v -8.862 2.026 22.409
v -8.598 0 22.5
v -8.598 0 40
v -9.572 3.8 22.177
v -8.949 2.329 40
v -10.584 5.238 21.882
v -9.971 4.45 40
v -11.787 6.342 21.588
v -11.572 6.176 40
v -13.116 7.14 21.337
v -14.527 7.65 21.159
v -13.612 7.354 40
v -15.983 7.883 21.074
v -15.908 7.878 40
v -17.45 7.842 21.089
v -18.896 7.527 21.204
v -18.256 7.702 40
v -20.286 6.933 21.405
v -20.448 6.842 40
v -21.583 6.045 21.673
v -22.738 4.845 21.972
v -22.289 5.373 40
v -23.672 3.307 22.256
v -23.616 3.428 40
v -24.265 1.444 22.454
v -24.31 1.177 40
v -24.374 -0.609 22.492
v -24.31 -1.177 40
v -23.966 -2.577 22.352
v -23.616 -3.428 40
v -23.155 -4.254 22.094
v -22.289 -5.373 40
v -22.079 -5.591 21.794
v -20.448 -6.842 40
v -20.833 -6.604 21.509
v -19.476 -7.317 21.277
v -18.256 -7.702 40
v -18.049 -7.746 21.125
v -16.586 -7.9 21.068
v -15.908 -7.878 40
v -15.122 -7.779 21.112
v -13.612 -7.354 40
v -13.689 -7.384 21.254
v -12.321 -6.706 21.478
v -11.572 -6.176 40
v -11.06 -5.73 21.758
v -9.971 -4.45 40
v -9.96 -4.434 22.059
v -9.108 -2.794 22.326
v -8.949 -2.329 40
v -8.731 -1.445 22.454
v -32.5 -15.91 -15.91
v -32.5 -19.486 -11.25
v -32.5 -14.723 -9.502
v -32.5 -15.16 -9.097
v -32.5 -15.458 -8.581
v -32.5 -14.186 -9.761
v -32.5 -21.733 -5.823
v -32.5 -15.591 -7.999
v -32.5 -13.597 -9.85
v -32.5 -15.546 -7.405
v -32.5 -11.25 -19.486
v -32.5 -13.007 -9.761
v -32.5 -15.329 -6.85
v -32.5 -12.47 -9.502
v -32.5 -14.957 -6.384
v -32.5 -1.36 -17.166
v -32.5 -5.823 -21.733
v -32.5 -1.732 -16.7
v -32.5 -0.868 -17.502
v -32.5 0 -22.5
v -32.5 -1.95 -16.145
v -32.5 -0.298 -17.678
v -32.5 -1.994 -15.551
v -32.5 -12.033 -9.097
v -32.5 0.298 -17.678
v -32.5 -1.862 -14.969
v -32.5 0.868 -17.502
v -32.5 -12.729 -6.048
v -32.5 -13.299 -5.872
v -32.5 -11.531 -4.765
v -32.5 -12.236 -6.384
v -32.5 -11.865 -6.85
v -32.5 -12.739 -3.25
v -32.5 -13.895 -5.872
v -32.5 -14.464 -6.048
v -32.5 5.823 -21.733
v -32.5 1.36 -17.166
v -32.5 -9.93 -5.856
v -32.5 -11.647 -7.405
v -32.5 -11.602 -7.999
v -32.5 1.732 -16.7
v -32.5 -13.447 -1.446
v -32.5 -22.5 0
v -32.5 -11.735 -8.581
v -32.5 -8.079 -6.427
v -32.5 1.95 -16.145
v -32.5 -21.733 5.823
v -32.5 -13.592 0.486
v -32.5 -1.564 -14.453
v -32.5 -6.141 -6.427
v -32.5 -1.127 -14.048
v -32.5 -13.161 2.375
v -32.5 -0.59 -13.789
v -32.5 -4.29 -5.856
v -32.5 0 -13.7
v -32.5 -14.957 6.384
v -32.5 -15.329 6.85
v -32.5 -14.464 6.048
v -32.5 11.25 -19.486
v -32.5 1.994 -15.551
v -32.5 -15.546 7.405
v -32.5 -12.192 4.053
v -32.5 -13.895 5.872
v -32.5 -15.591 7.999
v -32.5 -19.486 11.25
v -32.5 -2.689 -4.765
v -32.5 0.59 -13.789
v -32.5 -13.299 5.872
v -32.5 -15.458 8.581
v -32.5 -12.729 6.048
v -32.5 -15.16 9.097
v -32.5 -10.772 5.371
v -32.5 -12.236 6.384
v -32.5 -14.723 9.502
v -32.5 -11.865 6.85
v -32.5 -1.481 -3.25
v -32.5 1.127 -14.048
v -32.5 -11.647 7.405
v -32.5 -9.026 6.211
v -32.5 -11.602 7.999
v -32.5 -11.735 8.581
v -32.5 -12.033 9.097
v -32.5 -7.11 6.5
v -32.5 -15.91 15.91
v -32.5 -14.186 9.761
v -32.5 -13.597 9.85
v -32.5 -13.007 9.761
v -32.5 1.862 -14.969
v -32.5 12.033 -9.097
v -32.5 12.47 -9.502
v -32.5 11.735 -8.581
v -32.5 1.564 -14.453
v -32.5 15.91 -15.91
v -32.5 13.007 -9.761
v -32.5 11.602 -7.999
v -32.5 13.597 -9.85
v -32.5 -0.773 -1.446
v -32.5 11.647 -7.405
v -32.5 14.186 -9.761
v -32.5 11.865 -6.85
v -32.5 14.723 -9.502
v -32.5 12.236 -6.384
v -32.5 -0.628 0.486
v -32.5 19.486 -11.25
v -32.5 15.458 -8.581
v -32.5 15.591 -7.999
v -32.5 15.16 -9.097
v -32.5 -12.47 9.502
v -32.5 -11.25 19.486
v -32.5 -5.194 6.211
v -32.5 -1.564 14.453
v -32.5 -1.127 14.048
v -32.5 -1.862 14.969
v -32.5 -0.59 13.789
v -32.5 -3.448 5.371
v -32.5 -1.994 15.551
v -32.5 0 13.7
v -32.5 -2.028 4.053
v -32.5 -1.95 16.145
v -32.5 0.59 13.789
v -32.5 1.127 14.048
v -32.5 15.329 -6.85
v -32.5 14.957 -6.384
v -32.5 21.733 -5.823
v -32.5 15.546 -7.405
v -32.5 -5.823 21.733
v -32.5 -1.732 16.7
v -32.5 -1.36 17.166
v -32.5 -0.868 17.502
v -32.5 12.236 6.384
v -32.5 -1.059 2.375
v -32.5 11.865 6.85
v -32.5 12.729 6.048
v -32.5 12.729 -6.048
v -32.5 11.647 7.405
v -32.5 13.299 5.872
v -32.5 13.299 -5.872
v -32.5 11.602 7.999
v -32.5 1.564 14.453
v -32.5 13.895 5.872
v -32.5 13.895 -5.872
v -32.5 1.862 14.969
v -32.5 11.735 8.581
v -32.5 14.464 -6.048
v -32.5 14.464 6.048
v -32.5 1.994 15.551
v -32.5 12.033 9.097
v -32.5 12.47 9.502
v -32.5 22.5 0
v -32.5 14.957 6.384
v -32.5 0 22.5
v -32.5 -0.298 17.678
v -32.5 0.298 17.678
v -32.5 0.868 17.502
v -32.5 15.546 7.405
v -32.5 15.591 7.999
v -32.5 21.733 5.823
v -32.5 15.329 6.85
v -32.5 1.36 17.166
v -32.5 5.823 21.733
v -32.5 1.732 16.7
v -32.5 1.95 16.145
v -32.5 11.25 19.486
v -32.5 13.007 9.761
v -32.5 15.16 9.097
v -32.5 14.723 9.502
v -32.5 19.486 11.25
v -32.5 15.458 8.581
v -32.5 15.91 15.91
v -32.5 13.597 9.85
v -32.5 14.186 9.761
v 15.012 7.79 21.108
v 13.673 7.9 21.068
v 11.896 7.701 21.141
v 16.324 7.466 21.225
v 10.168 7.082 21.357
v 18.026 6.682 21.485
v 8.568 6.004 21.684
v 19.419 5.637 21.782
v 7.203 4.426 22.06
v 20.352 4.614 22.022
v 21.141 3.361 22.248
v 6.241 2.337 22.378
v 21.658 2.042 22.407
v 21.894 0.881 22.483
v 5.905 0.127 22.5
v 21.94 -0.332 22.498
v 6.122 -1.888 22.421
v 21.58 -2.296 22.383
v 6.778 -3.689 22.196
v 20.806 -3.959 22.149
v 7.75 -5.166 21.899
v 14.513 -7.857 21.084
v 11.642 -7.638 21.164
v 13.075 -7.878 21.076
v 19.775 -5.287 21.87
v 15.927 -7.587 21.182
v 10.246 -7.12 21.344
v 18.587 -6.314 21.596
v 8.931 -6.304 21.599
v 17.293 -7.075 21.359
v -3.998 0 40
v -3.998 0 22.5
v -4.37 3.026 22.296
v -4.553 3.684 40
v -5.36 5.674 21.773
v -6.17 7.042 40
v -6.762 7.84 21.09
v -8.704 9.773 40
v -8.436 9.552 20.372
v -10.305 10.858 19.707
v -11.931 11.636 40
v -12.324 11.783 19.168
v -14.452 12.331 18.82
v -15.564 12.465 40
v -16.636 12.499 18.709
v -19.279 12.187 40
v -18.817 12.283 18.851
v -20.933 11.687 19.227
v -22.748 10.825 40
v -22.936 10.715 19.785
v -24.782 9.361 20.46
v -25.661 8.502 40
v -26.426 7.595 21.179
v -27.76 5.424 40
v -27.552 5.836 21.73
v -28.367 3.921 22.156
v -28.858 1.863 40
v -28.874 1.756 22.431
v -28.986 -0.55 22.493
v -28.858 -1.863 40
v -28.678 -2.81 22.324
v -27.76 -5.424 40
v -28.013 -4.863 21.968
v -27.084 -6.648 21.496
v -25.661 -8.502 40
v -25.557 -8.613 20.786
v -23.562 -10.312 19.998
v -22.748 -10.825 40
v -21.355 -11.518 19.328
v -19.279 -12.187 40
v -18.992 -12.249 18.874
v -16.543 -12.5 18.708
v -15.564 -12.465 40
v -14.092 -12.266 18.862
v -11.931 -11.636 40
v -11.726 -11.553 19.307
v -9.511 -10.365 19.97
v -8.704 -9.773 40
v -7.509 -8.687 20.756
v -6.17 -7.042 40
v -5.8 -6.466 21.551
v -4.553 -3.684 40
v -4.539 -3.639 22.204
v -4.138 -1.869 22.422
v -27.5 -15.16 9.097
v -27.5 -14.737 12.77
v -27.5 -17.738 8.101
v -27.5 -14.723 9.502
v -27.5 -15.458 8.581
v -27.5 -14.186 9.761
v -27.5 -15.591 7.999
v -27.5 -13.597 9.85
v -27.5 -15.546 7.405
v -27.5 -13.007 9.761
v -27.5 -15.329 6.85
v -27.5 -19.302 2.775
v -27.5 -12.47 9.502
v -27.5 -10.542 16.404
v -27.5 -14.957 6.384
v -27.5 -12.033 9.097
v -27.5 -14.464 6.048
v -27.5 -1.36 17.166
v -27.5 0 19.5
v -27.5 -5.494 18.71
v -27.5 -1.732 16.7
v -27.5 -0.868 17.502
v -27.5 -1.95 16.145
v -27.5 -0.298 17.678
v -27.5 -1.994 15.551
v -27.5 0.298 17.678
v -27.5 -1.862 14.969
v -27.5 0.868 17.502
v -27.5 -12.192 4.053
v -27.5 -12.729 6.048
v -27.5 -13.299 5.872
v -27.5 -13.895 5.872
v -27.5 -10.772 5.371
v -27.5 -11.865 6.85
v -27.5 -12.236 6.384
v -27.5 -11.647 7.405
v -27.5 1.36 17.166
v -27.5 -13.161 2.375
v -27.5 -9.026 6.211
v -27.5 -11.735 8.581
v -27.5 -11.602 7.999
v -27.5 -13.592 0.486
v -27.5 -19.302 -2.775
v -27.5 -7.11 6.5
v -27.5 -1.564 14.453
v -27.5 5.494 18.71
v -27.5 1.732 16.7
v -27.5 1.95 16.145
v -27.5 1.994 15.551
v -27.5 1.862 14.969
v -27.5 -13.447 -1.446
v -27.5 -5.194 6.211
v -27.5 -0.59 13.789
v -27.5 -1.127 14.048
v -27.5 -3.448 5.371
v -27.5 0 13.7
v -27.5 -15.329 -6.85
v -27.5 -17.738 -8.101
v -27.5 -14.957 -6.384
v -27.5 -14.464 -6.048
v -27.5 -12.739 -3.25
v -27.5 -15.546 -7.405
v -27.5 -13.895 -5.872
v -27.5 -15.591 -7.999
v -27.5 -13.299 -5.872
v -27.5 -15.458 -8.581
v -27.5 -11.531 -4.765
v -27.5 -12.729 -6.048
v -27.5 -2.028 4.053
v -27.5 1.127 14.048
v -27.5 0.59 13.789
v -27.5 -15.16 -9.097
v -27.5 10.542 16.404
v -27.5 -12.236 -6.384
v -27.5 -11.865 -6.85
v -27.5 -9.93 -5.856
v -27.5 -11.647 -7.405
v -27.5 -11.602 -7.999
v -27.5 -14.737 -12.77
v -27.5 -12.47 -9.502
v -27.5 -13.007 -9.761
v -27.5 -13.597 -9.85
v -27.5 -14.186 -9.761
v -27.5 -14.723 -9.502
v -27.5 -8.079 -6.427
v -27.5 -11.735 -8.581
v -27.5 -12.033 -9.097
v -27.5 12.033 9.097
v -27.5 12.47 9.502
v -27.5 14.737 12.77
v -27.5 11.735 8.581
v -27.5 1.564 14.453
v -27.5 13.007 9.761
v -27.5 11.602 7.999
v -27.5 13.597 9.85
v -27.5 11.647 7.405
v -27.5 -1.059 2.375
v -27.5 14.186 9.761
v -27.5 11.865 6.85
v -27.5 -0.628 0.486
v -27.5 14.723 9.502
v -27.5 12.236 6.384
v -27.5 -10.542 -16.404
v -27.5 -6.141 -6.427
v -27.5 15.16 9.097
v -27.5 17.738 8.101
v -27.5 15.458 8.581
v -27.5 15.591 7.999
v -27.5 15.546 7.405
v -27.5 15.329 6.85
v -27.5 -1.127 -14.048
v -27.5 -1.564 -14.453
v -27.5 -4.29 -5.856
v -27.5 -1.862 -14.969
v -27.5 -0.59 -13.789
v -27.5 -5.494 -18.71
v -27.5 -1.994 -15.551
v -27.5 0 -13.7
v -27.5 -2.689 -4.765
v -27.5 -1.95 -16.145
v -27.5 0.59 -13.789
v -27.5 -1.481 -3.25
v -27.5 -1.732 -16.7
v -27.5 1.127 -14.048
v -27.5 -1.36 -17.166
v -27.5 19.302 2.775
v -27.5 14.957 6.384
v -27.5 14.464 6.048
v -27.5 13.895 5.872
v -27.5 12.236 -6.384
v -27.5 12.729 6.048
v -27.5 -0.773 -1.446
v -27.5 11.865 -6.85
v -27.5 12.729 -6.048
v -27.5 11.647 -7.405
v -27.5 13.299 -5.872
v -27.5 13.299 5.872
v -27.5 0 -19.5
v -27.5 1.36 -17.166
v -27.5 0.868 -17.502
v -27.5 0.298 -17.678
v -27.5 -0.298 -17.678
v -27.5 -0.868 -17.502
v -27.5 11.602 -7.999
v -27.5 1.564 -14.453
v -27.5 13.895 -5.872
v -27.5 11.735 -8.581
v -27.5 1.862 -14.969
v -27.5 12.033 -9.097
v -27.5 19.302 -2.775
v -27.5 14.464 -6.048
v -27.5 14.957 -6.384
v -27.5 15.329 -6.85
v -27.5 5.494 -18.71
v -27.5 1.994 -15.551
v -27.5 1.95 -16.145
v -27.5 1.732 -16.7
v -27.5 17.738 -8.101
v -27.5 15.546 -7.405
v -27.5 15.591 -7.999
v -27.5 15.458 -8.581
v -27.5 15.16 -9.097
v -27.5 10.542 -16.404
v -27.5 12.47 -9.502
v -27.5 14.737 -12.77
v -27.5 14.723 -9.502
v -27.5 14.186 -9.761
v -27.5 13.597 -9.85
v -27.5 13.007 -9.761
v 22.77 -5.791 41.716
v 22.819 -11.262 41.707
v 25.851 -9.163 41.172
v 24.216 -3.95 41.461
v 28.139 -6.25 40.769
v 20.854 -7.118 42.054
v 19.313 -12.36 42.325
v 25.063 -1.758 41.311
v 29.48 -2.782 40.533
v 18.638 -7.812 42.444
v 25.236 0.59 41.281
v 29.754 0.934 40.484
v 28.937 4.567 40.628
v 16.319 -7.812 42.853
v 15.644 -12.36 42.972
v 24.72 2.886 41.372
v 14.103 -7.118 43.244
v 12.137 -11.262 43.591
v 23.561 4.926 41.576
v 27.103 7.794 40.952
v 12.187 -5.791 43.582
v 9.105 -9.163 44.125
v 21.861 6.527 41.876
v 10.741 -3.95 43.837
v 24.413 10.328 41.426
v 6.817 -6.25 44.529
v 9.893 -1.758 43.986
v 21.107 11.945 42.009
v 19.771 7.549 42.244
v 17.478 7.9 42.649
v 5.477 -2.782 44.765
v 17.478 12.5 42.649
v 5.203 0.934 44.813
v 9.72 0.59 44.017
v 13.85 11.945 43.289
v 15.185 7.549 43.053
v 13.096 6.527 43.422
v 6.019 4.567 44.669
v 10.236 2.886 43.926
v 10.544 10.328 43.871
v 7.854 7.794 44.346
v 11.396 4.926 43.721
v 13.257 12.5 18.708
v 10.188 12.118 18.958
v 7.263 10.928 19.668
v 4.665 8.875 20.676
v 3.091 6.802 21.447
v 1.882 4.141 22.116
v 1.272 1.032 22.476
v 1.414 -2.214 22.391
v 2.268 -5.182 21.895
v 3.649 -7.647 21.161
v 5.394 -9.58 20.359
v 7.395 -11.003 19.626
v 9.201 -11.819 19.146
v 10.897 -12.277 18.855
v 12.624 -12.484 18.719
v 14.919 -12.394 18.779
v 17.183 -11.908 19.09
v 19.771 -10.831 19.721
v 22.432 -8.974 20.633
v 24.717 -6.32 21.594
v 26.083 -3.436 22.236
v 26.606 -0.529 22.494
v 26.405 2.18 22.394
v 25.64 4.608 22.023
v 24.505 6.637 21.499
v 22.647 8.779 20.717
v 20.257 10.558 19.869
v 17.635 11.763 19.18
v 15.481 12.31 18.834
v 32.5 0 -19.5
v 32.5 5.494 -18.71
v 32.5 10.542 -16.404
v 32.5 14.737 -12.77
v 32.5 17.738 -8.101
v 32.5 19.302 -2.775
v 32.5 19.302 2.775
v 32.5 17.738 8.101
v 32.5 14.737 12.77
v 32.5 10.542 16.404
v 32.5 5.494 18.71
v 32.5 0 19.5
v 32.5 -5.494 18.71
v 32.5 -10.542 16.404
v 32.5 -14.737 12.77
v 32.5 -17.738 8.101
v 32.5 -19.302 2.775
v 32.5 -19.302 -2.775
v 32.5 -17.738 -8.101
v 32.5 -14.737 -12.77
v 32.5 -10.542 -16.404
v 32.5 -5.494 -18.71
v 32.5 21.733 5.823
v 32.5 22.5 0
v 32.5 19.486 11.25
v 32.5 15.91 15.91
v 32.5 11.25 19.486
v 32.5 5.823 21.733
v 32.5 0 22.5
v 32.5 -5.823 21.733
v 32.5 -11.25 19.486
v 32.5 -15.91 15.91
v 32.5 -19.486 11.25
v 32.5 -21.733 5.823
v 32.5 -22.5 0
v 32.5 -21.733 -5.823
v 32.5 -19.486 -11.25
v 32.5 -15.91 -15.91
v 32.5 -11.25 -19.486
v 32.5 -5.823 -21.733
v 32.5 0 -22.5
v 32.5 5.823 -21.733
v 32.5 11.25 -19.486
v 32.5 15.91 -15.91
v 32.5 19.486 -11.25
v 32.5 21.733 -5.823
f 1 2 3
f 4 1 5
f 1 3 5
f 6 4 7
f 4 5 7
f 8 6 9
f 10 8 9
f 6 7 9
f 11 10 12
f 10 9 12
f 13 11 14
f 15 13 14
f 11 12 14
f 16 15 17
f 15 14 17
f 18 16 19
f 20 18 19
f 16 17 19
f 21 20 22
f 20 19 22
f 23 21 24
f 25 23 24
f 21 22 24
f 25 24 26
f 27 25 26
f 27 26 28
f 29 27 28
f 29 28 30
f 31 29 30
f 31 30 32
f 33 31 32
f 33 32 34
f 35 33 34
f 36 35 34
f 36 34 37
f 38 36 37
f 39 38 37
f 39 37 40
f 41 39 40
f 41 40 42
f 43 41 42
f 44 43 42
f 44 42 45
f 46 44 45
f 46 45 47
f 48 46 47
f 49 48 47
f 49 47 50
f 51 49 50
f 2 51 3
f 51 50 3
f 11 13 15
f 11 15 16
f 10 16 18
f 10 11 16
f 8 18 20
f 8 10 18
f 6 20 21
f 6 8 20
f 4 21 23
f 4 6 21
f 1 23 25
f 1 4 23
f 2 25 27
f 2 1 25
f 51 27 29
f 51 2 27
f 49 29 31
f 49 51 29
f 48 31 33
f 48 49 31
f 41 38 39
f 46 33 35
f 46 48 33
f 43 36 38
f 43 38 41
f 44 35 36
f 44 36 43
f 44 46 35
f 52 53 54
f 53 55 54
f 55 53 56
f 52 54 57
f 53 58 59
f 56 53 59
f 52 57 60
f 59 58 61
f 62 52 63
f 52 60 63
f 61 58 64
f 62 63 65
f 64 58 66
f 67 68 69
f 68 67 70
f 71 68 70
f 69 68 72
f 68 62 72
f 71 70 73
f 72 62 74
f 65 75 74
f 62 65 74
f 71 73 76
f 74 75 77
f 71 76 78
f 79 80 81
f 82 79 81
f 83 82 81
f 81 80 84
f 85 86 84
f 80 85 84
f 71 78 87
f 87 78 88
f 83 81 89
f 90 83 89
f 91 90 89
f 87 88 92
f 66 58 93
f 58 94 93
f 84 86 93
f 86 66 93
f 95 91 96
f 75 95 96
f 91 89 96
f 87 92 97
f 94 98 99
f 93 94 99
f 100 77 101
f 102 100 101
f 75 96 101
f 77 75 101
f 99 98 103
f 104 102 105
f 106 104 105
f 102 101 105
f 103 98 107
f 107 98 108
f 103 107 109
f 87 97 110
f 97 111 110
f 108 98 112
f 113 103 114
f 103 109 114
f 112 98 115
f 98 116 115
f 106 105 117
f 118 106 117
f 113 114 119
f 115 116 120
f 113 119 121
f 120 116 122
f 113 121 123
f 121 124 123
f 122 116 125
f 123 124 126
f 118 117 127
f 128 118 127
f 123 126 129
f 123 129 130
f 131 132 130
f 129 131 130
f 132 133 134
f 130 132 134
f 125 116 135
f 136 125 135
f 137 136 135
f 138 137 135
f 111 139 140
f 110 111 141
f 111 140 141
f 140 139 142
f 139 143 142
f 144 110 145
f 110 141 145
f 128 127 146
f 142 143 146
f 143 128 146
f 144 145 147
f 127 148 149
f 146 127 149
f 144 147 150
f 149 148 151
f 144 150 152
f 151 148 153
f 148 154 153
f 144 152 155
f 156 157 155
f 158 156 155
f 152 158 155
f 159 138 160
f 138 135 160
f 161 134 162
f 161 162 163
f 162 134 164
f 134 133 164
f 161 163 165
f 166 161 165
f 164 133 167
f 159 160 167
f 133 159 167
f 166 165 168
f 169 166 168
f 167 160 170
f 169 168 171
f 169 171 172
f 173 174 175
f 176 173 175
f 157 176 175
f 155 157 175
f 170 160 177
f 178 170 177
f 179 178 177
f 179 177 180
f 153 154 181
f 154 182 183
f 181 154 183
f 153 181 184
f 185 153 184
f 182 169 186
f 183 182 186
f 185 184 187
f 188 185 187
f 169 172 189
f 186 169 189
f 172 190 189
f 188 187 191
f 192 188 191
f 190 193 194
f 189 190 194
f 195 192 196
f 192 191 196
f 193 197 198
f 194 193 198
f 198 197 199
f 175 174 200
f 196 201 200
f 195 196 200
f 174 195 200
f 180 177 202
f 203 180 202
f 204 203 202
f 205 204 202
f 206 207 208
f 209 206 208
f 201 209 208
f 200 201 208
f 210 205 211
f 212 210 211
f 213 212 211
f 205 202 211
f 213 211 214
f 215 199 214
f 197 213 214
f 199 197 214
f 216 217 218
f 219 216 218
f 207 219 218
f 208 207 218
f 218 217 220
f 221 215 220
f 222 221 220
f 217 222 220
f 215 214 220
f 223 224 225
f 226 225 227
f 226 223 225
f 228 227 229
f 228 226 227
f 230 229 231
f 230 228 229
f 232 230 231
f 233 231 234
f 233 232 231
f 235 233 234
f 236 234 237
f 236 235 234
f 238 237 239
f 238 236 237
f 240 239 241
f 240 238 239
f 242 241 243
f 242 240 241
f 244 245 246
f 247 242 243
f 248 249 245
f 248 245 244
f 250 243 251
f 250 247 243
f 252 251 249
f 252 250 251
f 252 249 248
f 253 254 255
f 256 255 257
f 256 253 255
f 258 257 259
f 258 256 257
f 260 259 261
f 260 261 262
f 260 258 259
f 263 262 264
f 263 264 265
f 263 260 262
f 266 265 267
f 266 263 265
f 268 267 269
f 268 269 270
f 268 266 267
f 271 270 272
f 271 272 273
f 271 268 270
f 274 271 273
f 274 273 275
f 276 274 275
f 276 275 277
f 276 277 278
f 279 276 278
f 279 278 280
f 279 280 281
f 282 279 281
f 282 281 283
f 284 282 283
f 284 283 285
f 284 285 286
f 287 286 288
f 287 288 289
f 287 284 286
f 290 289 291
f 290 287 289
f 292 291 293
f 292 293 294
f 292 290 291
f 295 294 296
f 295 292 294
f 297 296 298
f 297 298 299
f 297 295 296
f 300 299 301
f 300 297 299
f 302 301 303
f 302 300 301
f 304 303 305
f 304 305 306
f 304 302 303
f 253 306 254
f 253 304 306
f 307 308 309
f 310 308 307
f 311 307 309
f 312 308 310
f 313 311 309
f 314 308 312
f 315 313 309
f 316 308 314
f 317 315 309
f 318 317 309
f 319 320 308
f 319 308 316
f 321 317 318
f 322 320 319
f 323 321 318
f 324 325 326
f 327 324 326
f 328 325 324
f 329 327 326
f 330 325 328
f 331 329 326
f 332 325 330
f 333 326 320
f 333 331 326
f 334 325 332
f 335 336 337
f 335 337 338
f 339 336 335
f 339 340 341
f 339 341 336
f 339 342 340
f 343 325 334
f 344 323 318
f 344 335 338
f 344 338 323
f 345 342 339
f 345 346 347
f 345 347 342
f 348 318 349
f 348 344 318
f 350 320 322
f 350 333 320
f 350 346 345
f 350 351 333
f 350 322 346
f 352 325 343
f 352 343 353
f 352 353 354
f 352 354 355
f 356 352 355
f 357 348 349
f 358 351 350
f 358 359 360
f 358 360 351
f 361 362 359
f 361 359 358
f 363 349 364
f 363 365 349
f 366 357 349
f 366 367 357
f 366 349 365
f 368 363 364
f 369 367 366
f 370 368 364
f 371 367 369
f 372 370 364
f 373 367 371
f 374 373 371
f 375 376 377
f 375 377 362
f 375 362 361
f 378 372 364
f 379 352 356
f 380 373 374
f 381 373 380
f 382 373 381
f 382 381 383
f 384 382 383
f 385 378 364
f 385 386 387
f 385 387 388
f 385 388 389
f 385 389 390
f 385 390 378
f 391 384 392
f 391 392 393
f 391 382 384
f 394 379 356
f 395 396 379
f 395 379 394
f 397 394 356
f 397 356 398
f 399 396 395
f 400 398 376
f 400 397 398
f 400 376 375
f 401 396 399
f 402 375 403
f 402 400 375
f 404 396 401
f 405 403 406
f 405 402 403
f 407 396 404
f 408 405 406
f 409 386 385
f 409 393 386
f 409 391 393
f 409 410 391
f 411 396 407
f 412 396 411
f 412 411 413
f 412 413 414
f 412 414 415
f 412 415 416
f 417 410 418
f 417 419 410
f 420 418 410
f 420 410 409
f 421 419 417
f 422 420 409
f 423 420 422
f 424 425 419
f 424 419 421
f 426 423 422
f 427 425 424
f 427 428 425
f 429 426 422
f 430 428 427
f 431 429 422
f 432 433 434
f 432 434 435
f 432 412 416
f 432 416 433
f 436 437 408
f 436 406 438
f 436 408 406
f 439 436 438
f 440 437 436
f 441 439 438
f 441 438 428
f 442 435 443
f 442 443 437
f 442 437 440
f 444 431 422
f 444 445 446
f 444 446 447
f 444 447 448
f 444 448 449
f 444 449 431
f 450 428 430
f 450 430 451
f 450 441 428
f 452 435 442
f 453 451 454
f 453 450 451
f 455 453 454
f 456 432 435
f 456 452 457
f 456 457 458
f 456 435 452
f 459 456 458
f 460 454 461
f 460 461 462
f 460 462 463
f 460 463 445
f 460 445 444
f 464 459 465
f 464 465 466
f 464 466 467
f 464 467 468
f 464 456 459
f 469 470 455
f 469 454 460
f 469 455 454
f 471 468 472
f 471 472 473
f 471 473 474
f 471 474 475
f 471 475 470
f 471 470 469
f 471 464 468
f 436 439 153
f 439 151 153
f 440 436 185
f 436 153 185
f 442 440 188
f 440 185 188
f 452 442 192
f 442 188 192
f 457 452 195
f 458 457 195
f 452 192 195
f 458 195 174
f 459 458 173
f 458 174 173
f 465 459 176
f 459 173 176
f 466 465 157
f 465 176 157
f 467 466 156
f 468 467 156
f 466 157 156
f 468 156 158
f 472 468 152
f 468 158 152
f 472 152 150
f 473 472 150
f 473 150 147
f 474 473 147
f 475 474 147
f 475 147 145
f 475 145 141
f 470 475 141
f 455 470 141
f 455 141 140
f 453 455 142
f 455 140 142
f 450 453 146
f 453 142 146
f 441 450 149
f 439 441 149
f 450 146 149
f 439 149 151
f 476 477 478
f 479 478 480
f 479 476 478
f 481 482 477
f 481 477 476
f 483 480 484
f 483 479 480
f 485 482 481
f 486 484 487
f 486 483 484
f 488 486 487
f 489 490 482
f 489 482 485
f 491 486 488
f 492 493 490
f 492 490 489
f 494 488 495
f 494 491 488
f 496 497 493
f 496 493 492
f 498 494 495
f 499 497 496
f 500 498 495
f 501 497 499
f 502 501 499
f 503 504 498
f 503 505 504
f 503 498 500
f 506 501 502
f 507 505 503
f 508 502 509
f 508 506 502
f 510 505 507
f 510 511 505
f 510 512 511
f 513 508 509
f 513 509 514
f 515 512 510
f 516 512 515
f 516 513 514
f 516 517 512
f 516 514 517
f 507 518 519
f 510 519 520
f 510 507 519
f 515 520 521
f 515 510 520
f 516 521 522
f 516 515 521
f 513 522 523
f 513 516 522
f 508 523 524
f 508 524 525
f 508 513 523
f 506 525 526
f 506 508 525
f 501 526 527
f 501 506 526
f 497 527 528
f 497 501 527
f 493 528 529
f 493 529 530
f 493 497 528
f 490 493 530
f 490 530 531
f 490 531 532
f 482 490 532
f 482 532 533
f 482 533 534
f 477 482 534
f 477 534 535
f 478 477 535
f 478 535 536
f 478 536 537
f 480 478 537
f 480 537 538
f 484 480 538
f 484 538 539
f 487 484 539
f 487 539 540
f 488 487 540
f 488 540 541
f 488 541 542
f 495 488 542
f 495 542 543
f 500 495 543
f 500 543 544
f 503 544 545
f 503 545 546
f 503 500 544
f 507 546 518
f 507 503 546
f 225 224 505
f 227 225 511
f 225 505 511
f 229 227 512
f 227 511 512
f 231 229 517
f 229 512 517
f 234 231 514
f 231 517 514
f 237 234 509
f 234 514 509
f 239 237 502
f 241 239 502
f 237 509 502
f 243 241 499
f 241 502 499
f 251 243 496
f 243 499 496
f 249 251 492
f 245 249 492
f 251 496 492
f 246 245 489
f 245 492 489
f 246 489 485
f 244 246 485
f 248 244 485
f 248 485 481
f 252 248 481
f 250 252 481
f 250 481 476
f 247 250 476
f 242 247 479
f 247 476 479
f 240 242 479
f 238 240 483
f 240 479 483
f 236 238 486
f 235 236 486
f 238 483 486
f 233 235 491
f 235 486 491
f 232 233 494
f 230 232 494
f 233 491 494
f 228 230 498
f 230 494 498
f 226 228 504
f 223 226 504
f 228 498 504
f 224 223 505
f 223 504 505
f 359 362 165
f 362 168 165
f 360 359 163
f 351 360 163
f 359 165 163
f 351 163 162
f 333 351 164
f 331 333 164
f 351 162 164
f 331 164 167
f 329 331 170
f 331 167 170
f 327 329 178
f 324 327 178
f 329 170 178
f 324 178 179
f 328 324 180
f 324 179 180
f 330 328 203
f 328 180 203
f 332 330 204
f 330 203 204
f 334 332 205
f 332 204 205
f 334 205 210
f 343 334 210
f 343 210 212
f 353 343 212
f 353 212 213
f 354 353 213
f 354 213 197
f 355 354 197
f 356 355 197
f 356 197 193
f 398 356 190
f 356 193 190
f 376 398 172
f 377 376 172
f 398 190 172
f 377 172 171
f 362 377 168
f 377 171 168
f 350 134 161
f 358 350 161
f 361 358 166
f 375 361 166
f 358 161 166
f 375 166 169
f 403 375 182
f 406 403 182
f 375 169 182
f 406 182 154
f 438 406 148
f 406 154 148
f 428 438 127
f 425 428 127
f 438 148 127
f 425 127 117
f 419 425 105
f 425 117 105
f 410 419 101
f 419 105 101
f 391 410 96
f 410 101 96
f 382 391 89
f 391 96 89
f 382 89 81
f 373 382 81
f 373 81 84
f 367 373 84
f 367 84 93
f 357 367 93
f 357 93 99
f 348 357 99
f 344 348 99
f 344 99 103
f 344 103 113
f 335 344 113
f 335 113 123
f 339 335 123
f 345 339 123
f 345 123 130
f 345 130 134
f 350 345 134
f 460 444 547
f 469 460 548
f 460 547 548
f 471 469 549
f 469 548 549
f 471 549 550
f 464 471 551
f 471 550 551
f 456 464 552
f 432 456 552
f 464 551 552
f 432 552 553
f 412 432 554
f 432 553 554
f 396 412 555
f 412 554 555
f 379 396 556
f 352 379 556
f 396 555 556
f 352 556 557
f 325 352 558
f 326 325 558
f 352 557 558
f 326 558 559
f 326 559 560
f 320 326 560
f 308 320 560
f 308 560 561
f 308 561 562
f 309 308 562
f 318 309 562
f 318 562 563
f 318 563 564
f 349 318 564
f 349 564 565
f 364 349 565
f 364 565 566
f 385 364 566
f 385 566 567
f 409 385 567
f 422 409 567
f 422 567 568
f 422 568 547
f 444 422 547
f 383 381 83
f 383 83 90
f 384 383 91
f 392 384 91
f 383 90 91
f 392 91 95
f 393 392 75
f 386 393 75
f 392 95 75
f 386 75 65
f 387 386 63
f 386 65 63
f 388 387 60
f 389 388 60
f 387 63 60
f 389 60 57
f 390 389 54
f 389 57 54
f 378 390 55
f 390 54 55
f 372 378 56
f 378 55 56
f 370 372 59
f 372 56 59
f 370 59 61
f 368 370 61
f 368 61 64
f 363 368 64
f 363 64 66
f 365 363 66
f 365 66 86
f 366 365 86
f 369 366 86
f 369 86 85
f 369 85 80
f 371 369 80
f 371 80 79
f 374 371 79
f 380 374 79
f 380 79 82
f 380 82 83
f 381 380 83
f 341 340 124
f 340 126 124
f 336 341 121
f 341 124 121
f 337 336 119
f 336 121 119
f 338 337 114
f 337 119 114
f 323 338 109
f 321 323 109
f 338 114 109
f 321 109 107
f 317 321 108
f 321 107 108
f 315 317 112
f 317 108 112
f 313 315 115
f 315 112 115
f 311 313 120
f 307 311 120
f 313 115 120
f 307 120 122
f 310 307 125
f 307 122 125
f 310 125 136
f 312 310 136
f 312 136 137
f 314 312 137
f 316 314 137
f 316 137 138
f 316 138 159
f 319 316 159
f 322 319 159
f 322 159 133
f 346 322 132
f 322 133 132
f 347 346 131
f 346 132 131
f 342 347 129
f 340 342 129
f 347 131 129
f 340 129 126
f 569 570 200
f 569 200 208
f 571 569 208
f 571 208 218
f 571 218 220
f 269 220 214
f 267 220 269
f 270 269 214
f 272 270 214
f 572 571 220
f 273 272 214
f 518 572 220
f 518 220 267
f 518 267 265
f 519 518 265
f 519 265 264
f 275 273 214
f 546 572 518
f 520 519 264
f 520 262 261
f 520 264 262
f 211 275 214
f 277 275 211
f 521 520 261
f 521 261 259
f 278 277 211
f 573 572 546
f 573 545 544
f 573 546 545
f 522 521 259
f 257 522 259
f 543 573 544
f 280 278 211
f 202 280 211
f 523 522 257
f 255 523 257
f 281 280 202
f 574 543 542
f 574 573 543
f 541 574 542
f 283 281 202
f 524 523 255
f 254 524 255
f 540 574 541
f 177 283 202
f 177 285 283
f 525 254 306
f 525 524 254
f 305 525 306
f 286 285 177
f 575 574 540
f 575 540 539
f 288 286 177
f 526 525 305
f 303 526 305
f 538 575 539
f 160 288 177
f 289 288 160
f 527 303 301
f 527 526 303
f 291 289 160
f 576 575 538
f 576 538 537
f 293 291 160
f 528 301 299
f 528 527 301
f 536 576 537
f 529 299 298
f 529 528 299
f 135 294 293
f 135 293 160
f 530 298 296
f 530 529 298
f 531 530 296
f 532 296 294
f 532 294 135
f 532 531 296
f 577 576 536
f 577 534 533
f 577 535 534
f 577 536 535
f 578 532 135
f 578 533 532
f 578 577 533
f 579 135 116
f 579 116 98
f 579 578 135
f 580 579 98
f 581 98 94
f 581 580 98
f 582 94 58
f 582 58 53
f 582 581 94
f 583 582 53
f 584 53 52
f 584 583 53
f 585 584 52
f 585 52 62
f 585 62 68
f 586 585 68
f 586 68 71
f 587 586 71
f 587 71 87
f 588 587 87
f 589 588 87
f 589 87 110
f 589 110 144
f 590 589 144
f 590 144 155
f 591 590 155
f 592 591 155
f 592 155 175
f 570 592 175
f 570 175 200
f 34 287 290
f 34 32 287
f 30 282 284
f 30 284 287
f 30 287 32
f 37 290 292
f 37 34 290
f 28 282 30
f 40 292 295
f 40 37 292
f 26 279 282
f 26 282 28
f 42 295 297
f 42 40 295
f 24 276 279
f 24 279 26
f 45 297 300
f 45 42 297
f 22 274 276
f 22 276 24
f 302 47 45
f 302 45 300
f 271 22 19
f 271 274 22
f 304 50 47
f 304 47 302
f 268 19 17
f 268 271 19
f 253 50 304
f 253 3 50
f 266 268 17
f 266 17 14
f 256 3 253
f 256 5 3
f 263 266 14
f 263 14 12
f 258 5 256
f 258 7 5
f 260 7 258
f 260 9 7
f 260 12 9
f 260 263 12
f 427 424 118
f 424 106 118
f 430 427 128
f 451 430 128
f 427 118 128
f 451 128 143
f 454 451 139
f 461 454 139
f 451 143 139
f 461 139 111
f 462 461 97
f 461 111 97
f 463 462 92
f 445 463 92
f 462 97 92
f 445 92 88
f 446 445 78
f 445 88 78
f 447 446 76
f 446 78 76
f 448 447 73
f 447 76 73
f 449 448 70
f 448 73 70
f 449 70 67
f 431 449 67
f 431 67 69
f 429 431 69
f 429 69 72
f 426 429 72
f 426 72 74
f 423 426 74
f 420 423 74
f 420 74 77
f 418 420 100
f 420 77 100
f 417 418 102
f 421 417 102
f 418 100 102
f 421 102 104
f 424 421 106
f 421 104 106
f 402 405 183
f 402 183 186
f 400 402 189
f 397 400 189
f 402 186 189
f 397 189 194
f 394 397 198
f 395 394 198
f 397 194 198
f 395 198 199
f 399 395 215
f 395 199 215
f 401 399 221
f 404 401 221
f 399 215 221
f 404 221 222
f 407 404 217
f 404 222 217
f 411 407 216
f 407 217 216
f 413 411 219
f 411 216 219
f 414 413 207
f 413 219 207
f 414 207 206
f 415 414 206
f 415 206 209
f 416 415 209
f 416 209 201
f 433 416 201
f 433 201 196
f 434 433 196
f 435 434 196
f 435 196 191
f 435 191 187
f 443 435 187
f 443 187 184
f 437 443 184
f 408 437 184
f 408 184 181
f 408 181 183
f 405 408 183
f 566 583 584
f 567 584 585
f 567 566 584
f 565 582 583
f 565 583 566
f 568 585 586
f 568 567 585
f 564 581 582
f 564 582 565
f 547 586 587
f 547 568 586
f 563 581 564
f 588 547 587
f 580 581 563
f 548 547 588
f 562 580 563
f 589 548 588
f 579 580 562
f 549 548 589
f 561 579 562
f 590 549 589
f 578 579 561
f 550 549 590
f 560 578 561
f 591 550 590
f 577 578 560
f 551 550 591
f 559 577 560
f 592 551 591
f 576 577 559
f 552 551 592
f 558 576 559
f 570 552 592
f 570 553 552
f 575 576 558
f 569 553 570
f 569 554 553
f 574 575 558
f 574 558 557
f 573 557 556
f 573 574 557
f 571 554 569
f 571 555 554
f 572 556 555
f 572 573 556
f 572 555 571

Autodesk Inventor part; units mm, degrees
ref_plane "YZ Plane" through (0, 0, 0) normal (1, 0, 0) x (0, 1, 0)
sketch "Sketch2" plane through (0, 0, 0) normal (1, 0, 0) x (0, 1, 0)
  circle A0 centre (0, 0) radius 19.5
  circle A1 centre (0, 0) radius 22.5
  dimension "d0" = 39
  dimension "d1" = 45
extrude "Extrusion1" add sketch "Sketch2" along normal mid plane 65 contours A0 | A1
sketch "Sketch3" plane through (32.5, 0, 0) normal (1, 0, 0) x (0, 0, -1)
  circle A0 centre (0, 0) radius 19.5
  dimension "d4" = 39
extrude "Extrusion2" cut sketch "Sketch3" against normal blind 60
sketch "Sketch4" plane through (-32.5, 0, 0) normal (-1, 0, 0) x (0, 0, 1)
  circle A0 centre (-15.7, 0) radius 2
  point P0 (0, 0)
  point P1 (0, 0)
  dimension "d7" = 4
  dimension "d45" = 15.7
extrude "Extrusion3" cut sketch "Sketch4" against normal blind 5
pattern_circular "Circular Pattern1" count 6 over 360 about axis through (-10, 0, 0) along (1, 0, 0) of "Extrusion3"
sketch "Sketch5" plane through (-32.5, 0, 0) normal (-1, 0, 0) x (0, 0, 1)
  circle A0 centre (0, -7.11) radius 6.5
  point P0 (0, 0)
  dimension "d13" = 13
extrude "Extrusion4" cut sketch "Sketch5" against normal blind 5
ref_plane "Work Plane1" through (0, 0, 40) normal (0, 0, 1) x (1, 0, 0)
sketch "Sketch6" plane through (0, 0, 40) normal (0, 0, 1) x (1, 0, 0)
  circle A0 centre (-16.4979, 0) radius 12.5
  circle A1 centre (-16.4979, 0) radius 7.9
  point P0 (0, 0)
  dimension "d17" = 25
  dimension "d18" = 15.8
extrude "Extrusion5" add sketch "Sketch6" against normal up to surface
sketch "Sketch7" plane through (0, 0, 40) normal (0, 0, 1) x (1, 0, 0)
  line L0 (32.5, -22.5) -> (32.5, 22.5) projected
  point P0 (0, 0)
ref_plane "Work Plane2" through (32.5, -22.5, 40) normal (0.1736, 0, 0.9848) x (0, 1, 0)
sketch "Sketch8" plane through (32.5, -22.5, 40) normal (0.1736, 0, 0.9848) x (0, 1, 0)
  circle A0 centre (22.5, 15.2535) radius 12.5
  circle A1 centre (22.5, 15.2535) radius 7.9
  ellipse E0 centre (22.5, 48.2535) end of major axis (30.4, 48.2535) minor radius 7.78 projected
  point P0 (22.5, 25.0603)
  dimension "d22" = 25
  dimension "d23" = 15.8
  dimension "d26" = 33
extrude "Extrusion6" add sketch "Sketch8" against normal up to surface contours A0
sketch "Sketch9" plane through (-32.5, 0, 0) normal (-1, 0, 0) x (0, 0, 1)
  circle A0 centre (0, -7.11) radius 6.5 projected
  circle A1 centre (-7.85, -13.5966) radius 2 projected
  circle A2 centre (7.85, -13.5966) radius 2 projected
  circle A3 centre (15.7, 0) radius 2 projected
  circle A4 centre (7.85, 13.5966) radius 2 projected
  circle A5 centre (-7.85, 13.5966) radius 2 projected
  circle A6 centre (-15.7, 0) radius 2 projected
  circle A7 centre (0, 0) radius 22.5 projected
properties part number "SoporteMotor" material "PLA"
